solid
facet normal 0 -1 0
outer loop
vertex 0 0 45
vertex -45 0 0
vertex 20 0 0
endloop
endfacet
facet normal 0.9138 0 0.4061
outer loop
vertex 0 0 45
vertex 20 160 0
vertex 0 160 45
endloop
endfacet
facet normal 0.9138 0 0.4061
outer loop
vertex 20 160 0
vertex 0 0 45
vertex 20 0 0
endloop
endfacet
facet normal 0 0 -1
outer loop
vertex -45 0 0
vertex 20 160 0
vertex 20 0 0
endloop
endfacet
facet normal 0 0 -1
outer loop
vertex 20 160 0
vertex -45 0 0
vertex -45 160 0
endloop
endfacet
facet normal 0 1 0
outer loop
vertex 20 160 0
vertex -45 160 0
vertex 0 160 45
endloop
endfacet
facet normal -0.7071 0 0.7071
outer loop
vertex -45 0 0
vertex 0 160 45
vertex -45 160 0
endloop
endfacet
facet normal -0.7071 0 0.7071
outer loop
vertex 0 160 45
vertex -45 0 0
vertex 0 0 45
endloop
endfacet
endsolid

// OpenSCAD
//Draw a prism based on a 
//right angled triangle
//l - length of prism
//w - width of triangle
//h - height of triangle
module prism(l, w, h) {
       polyhedron(points=[
               [0,0,h],           // 0    front top corner
               [0,0,0],[w,0,0],   // 1, 2 front left & right bottom corners
               [0,l,h],           // 3    back top corner
               [0,l,0],[w,l,0]    // 4, 5 back left & right bottom corners
       ], faces=[ // points for all faces must be ordered clockwise when looking in
               [0,2,1],    // top face
               [3,4,5],    // base face
               [0,1,4,3],  // h face
               [1,2,5,4],  // w face
               [0,3,5,2],  // hypotenuse face
       ]);
}

prism(160, 20, 45);

translate([0, 160, 0])
rotate([0, 0, 180])
prism(160, 45, 45);
